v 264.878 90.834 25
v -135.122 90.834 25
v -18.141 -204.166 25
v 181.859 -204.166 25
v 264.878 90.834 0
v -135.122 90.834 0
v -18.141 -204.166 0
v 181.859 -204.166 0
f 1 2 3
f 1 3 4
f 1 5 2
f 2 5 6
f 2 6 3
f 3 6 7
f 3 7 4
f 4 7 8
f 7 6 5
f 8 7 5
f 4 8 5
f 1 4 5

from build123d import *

# Parameters (mm, degrees)
F1_DEPTH = 25
F2_DEPTH = 25
F3_DEPTH = 25
F4_DEPTH = 25
F5_DEPTH = 25
F6_DEPTH = 25


with BuildPart() as f1:
    # F0 (on Top) → F1 (new body)
    with BuildSketch(Plane.XY):
        Polygon((264.877629, 90.833528), (-135.122371, 90.833528), (-18.141241, -204.166472), (181.858759, -204.166472), align=None)
    extrude(amount=F1_DEPTH)

    # F0 (on Top) → F2 (join)
    with BuildSketch(Plane.XY):
        Polygon((264.877629, 90.833528), (-135.122371, 90.833528), (-18.141241, -204.166472), (181.858759, -204.166472), align=None)
    extrude(amount=F2_DEPTH)

    # F0 (on Top) → F3 (join)
    with BuildSketch(Plane.XY):
        Polygon((264.877629, 90.833528), (-135.122371, 90.833528), (-18.141241, -204.166472), (181.858759, -204.166472), align=None)
    extrude(amount=F3_DEPTH)

    # F0 (on Top) → F4 (join)
    with BuildSketch(Plane.XY):
        Polygon((264.877629, 90.833528), (-135.122371, 90.833528), (-18.141241, -204.166472), (181.858759, -204.166472), align=None)
    extrude(amount=F4_DEPTH)

    # F0 (on Top) → F5 (join)
    with BuildSketch(Plane.XY):
        Polygon((264.877629, 90.833528), (-135.122371, 90.833528), (-18.141241, -204.166472), (181.858759, -204.166472), align=None)
    extrude(amount=F5_DEPTH)

    # F0 (on Top) → F6 (join)
    with BuildSketch(Plane.XY):
        Polygon((264.877629, 90.833528), (-135.122371, 90.833528), (-18.141241, -204.166472), (181.858759, -204.166472), align=None)
    extrude(amount=F6_DEPTH)


solid = f1.part
